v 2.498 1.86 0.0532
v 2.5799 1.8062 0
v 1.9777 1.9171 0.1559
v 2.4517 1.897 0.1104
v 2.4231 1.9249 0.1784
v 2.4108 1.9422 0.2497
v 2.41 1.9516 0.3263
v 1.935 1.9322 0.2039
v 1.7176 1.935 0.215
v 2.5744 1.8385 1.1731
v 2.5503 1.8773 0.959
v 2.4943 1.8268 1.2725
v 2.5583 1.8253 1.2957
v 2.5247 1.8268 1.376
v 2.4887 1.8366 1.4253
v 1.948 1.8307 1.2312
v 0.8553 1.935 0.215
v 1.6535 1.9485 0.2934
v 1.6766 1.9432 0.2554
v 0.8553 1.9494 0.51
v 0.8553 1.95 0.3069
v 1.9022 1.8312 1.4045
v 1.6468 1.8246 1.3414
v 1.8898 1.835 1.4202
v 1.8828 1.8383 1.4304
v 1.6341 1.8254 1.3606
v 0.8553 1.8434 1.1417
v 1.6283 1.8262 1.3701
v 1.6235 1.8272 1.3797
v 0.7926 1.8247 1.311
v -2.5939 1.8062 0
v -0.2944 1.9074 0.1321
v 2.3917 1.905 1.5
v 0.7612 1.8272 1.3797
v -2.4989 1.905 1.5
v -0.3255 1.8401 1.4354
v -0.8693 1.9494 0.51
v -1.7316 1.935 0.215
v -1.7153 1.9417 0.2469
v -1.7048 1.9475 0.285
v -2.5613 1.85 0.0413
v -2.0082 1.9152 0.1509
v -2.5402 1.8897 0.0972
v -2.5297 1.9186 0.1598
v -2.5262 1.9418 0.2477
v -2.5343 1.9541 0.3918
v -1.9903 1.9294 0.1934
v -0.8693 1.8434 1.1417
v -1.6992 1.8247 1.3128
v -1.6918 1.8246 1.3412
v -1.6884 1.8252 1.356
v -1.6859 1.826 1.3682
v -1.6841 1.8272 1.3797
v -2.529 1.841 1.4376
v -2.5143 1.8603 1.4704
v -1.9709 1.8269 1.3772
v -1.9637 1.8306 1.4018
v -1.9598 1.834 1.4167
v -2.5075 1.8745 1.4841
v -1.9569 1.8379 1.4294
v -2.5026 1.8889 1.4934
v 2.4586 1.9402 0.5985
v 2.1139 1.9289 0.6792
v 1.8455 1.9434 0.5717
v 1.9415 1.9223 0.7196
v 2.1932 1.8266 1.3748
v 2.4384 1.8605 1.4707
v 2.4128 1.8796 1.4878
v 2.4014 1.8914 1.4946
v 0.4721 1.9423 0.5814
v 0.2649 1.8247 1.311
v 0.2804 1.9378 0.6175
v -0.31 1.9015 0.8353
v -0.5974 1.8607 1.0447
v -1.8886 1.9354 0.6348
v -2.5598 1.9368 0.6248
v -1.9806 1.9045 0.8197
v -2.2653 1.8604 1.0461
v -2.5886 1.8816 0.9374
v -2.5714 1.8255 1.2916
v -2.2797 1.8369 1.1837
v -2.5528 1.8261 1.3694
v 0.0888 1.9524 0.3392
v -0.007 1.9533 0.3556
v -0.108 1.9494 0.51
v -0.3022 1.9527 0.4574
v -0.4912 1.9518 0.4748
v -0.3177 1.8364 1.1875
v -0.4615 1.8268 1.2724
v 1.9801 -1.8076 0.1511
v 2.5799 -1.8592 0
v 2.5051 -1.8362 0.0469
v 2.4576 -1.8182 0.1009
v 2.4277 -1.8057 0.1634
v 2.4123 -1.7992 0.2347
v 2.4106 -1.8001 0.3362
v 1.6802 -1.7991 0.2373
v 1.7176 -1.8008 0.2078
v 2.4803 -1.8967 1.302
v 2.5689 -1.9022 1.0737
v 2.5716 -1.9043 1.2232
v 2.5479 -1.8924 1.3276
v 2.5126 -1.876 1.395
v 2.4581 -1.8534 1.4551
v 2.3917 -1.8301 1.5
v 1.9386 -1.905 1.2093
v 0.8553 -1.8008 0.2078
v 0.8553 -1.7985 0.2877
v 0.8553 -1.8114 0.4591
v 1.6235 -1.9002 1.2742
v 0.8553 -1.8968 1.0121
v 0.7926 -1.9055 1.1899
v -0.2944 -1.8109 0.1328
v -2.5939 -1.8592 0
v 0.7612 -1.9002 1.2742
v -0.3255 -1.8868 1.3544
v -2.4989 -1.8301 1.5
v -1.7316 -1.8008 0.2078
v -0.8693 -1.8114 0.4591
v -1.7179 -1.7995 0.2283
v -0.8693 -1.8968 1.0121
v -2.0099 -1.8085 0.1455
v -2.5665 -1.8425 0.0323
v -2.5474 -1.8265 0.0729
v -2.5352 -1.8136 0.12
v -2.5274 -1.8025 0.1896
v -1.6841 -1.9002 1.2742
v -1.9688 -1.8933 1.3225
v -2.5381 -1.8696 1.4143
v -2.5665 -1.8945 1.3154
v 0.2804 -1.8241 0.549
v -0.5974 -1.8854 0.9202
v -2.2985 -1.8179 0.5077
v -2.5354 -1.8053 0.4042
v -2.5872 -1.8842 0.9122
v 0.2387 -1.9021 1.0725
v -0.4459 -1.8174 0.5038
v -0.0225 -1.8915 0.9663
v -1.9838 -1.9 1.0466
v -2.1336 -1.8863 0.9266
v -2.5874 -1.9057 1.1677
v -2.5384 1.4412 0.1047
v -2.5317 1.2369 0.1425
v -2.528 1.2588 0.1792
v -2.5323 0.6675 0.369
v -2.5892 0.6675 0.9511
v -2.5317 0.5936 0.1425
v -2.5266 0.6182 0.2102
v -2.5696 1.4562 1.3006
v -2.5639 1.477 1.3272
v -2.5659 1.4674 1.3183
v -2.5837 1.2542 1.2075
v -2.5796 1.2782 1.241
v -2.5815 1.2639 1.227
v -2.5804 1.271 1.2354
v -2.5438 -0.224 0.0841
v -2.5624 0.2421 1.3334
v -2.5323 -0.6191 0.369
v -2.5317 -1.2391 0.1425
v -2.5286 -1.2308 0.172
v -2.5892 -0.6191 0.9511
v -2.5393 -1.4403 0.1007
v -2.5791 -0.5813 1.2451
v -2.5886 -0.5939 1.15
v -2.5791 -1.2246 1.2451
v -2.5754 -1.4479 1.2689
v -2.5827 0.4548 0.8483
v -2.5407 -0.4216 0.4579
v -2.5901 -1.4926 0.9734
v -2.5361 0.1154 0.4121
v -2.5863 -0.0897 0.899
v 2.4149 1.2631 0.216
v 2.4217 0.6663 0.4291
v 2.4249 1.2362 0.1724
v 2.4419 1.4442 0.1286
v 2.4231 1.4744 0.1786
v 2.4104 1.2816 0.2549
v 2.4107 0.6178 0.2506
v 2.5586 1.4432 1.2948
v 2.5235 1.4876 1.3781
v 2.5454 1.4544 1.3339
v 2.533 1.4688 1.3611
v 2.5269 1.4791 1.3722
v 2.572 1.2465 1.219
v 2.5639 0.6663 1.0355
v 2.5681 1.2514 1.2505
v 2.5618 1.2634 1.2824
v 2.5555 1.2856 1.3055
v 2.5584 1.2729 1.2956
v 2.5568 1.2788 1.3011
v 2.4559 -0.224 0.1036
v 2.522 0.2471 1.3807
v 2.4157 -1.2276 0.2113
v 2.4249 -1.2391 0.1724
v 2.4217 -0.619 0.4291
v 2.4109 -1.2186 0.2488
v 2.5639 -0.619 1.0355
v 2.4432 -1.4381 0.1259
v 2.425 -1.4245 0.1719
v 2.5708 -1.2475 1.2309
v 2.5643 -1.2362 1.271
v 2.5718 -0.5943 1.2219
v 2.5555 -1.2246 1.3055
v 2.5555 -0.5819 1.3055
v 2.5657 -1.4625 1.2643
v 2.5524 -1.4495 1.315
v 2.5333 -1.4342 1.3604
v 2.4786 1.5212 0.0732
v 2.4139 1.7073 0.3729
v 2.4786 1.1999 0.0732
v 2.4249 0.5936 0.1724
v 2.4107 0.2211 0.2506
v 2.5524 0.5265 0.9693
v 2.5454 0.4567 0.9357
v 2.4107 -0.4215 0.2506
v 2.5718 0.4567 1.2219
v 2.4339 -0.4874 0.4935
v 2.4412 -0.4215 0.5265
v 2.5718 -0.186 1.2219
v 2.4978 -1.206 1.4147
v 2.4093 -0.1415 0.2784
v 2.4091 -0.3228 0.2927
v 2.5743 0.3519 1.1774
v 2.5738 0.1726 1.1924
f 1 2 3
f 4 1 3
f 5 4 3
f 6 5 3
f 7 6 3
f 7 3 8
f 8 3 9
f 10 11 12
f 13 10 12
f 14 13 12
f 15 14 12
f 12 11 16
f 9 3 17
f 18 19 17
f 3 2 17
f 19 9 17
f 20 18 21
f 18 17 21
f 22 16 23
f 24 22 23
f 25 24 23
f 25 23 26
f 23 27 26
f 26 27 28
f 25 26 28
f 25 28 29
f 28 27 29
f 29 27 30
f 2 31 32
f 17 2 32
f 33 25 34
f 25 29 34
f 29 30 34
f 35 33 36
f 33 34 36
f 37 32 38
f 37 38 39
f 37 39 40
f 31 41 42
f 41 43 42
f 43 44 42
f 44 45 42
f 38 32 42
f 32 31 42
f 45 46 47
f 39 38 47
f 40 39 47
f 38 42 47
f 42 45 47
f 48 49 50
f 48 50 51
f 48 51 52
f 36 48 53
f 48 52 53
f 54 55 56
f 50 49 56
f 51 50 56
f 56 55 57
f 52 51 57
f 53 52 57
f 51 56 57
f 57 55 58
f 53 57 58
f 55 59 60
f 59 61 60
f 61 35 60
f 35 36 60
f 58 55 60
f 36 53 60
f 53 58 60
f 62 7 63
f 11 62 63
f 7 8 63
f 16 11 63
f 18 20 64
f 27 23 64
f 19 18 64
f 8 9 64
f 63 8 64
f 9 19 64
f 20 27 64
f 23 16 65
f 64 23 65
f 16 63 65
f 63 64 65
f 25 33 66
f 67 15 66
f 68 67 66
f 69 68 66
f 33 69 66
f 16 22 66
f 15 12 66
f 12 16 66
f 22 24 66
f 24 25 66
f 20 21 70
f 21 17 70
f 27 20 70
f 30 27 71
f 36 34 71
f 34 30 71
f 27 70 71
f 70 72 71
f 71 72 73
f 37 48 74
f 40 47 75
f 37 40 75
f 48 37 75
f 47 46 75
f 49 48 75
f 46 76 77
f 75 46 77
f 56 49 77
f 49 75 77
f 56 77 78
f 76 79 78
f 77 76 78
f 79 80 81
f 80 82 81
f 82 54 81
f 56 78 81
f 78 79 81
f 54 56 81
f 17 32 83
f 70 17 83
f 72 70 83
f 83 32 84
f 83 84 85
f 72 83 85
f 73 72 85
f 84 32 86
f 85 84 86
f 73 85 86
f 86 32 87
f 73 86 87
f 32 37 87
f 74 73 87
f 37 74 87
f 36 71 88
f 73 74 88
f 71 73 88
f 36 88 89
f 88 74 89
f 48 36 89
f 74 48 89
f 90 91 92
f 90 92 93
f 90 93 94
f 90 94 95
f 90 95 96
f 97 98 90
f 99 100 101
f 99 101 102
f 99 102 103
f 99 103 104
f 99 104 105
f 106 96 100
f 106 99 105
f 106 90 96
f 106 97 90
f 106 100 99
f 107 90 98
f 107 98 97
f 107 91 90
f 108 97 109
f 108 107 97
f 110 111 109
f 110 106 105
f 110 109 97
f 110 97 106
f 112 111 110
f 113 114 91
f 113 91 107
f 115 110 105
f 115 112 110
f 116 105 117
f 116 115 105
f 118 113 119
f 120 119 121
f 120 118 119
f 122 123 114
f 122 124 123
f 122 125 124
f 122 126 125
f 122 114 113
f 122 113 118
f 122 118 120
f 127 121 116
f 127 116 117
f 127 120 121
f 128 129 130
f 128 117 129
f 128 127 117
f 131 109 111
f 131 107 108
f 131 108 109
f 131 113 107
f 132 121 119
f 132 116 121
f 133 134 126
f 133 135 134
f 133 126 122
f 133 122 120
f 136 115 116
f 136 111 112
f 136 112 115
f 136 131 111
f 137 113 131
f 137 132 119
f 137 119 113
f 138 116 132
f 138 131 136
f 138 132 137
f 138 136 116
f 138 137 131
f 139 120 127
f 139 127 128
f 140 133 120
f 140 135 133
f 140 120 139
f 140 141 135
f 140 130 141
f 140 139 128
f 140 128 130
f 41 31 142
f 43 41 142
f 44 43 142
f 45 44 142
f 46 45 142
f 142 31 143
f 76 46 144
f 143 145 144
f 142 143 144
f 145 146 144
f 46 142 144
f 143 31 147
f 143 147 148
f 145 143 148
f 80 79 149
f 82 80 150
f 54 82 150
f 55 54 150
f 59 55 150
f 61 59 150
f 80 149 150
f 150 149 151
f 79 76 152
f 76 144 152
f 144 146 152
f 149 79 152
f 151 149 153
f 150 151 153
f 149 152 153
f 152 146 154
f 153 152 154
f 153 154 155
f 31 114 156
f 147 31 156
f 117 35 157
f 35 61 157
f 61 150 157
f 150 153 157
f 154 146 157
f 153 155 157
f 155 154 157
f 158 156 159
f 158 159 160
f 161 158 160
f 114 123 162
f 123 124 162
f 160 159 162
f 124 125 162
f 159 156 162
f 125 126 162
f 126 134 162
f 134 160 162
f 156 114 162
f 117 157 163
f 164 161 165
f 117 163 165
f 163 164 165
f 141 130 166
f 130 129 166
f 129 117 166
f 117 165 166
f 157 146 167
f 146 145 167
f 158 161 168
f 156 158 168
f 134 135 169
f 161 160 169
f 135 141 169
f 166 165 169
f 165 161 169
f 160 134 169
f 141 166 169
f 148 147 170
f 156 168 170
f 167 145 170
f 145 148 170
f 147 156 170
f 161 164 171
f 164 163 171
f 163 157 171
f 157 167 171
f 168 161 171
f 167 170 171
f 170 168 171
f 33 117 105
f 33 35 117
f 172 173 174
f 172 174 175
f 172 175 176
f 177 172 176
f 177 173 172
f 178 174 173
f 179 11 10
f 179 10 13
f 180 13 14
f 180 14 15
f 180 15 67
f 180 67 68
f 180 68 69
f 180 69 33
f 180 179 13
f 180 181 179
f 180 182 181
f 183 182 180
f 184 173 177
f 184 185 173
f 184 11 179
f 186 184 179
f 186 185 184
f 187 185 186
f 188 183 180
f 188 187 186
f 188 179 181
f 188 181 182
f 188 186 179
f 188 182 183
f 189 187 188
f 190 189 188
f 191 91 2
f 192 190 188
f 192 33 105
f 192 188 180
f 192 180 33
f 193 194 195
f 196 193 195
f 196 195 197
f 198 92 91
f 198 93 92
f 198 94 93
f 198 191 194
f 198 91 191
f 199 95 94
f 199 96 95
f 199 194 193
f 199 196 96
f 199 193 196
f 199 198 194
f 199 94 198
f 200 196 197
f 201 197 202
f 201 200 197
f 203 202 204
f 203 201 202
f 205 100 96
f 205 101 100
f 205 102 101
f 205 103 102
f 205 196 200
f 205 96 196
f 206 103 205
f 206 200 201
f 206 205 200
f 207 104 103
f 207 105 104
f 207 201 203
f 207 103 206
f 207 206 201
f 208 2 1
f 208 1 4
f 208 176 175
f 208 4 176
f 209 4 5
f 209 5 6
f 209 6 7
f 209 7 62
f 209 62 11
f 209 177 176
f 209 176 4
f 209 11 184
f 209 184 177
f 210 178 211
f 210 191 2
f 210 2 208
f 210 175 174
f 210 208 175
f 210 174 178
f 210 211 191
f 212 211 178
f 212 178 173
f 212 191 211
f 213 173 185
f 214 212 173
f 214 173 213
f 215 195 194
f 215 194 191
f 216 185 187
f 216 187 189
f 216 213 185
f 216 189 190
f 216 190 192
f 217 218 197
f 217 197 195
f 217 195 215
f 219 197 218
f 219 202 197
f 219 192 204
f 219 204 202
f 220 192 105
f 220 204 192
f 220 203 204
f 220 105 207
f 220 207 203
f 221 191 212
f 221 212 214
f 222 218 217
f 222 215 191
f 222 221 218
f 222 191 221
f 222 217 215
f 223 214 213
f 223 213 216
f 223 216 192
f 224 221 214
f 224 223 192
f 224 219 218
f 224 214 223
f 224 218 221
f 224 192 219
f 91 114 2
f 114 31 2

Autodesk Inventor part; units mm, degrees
ref_plane "YZ Plane" through (0, 0, 0) normal (1, 0, 0) x (0, 1, 0)
ref_plane "XZ Plane" through (0, 0, 0) normal (0, 1, 0) x (-1, 0, 0)
ref_plane "XY Plane" through (0, 0, 0) normal (0, 0, 1) x (1, 0, 0)
sketch "Эскиз1" plane through (0, 0, 0) normal (0, 0, 1) x (1, 0, 0)
  line L0 (-2.365, 1.705) -> (-2.365, -1.705) projected
  line L1 (-2.365, -1.705) -> (-1.665, -1.705) projected
  line L2 (2.365, 1.705) -> (1.665, 1.705) projected
  line L3 (2.365, -1.705) -> (2.365, 1.705) projected
  line L4 (-2.665, -2.005) -> (2.665, -2.005)
  line L5 (2.665, -2.005) -> (2.665, 2.005)
  line L6 (2.665, 2.005) -> (-2.665, 2.005)
  line L7 (-2.665, 2.005) -> (-2.665, -2.005)
  point P0 (0, 0)
  dimension "d0" = 0.3
  dimension "d1" = 0.3
  dimension "d2" = 0.3
  dimension "d3" = 0.3
extrude "Выдавливание1" add sketch "Эскиз1" along normal blind 1.5
ref_plane "РабПлоскость1" through (-2.665, 2.005, 0) normal (-1, 0, 0) x (0, -1, 0)
ref_plane "РабПлоскость2" through (-2.665, -2.005, 0) normal (0, -1, 0) x (1, 0, 0)
sketch "Эскиз2" plane through (-2.665, -2.005, 0) normal (0, -1, 0) x (1, 0, 0)
  line L0 (5.33, 1.5) -> (0, 1.5) projected
  line L1 (0, 0) -> (0, 1.5) projected
  line L2 (0, 0) -> (5.33, 0) projected
  line L3 (5.33, 0) -> (5.33, 1.5) projected
  spline S0 degree 3 poles (5.2449, 0) (4.7317, 0.2339) (5.5909, 1.213) (5.0567, 1.5) knots 0 0 0 0 1 1 1 1
  spline S1 degree 3 poles (0.0711, 0) (0.2805, 0.1803) (-0.0864, 1.0499) (0.1661, 1.5) knots 0 0 0 0 1 1 1 1
  point P0 (2.665, 0)
  point P1 (5.0772, 0.3564)
  point P2 (5.2329, 1.0651)
  point P3 (0.1387, 0.2211)
  point P4 (0.0821, 0.8519)
extrude "Выдавливание2" cut sketch "Эскиз2" against normal through all contours L3 L2 S0 L0 | S1 L2 L1 L0
sketch "Эскиз3" plane through (-2.665, 2.005, 0) normal (-1, 0, 0) x (0, -1, 0)
  line L0 (0, 0) -> (0, 1.5) projected
  line L1 (4.01, 0) -> (0, 0) projected
  line L2 (4.01, 1.5) -> (4.01, 0) projected
  line L3 (0, 1.5) -> (4.01, 1.5) projected
  spline S0 degree 3 poles (3.8642, 0) (3.6548, 0.359) (4.0728, 1.0978) (3.8351, 1.5) knots 0 0 0 0 1 1 1 1
  spline S1 degree 3 poles (0.1988, 0) (-0.208, 0.3173) (0.3844, 1.4102) (0.1, 1.5) knots 0 0 0 0 1 1 1 1
  point P0 (2.005, 0)
  point P1 (3.8109, 0.4111)
  point P2 (3.9029, 1.023)
  point P3 (0.0634, 0.5877)
  point P4 (0.1805, 1.327)
extrude "Выдавливание3" cut sketch "Эскиз3" against normal through all contours L0 L3 S1 L1 | S0 L3 L2 L1
properties part number "GP-WSM010 board"
